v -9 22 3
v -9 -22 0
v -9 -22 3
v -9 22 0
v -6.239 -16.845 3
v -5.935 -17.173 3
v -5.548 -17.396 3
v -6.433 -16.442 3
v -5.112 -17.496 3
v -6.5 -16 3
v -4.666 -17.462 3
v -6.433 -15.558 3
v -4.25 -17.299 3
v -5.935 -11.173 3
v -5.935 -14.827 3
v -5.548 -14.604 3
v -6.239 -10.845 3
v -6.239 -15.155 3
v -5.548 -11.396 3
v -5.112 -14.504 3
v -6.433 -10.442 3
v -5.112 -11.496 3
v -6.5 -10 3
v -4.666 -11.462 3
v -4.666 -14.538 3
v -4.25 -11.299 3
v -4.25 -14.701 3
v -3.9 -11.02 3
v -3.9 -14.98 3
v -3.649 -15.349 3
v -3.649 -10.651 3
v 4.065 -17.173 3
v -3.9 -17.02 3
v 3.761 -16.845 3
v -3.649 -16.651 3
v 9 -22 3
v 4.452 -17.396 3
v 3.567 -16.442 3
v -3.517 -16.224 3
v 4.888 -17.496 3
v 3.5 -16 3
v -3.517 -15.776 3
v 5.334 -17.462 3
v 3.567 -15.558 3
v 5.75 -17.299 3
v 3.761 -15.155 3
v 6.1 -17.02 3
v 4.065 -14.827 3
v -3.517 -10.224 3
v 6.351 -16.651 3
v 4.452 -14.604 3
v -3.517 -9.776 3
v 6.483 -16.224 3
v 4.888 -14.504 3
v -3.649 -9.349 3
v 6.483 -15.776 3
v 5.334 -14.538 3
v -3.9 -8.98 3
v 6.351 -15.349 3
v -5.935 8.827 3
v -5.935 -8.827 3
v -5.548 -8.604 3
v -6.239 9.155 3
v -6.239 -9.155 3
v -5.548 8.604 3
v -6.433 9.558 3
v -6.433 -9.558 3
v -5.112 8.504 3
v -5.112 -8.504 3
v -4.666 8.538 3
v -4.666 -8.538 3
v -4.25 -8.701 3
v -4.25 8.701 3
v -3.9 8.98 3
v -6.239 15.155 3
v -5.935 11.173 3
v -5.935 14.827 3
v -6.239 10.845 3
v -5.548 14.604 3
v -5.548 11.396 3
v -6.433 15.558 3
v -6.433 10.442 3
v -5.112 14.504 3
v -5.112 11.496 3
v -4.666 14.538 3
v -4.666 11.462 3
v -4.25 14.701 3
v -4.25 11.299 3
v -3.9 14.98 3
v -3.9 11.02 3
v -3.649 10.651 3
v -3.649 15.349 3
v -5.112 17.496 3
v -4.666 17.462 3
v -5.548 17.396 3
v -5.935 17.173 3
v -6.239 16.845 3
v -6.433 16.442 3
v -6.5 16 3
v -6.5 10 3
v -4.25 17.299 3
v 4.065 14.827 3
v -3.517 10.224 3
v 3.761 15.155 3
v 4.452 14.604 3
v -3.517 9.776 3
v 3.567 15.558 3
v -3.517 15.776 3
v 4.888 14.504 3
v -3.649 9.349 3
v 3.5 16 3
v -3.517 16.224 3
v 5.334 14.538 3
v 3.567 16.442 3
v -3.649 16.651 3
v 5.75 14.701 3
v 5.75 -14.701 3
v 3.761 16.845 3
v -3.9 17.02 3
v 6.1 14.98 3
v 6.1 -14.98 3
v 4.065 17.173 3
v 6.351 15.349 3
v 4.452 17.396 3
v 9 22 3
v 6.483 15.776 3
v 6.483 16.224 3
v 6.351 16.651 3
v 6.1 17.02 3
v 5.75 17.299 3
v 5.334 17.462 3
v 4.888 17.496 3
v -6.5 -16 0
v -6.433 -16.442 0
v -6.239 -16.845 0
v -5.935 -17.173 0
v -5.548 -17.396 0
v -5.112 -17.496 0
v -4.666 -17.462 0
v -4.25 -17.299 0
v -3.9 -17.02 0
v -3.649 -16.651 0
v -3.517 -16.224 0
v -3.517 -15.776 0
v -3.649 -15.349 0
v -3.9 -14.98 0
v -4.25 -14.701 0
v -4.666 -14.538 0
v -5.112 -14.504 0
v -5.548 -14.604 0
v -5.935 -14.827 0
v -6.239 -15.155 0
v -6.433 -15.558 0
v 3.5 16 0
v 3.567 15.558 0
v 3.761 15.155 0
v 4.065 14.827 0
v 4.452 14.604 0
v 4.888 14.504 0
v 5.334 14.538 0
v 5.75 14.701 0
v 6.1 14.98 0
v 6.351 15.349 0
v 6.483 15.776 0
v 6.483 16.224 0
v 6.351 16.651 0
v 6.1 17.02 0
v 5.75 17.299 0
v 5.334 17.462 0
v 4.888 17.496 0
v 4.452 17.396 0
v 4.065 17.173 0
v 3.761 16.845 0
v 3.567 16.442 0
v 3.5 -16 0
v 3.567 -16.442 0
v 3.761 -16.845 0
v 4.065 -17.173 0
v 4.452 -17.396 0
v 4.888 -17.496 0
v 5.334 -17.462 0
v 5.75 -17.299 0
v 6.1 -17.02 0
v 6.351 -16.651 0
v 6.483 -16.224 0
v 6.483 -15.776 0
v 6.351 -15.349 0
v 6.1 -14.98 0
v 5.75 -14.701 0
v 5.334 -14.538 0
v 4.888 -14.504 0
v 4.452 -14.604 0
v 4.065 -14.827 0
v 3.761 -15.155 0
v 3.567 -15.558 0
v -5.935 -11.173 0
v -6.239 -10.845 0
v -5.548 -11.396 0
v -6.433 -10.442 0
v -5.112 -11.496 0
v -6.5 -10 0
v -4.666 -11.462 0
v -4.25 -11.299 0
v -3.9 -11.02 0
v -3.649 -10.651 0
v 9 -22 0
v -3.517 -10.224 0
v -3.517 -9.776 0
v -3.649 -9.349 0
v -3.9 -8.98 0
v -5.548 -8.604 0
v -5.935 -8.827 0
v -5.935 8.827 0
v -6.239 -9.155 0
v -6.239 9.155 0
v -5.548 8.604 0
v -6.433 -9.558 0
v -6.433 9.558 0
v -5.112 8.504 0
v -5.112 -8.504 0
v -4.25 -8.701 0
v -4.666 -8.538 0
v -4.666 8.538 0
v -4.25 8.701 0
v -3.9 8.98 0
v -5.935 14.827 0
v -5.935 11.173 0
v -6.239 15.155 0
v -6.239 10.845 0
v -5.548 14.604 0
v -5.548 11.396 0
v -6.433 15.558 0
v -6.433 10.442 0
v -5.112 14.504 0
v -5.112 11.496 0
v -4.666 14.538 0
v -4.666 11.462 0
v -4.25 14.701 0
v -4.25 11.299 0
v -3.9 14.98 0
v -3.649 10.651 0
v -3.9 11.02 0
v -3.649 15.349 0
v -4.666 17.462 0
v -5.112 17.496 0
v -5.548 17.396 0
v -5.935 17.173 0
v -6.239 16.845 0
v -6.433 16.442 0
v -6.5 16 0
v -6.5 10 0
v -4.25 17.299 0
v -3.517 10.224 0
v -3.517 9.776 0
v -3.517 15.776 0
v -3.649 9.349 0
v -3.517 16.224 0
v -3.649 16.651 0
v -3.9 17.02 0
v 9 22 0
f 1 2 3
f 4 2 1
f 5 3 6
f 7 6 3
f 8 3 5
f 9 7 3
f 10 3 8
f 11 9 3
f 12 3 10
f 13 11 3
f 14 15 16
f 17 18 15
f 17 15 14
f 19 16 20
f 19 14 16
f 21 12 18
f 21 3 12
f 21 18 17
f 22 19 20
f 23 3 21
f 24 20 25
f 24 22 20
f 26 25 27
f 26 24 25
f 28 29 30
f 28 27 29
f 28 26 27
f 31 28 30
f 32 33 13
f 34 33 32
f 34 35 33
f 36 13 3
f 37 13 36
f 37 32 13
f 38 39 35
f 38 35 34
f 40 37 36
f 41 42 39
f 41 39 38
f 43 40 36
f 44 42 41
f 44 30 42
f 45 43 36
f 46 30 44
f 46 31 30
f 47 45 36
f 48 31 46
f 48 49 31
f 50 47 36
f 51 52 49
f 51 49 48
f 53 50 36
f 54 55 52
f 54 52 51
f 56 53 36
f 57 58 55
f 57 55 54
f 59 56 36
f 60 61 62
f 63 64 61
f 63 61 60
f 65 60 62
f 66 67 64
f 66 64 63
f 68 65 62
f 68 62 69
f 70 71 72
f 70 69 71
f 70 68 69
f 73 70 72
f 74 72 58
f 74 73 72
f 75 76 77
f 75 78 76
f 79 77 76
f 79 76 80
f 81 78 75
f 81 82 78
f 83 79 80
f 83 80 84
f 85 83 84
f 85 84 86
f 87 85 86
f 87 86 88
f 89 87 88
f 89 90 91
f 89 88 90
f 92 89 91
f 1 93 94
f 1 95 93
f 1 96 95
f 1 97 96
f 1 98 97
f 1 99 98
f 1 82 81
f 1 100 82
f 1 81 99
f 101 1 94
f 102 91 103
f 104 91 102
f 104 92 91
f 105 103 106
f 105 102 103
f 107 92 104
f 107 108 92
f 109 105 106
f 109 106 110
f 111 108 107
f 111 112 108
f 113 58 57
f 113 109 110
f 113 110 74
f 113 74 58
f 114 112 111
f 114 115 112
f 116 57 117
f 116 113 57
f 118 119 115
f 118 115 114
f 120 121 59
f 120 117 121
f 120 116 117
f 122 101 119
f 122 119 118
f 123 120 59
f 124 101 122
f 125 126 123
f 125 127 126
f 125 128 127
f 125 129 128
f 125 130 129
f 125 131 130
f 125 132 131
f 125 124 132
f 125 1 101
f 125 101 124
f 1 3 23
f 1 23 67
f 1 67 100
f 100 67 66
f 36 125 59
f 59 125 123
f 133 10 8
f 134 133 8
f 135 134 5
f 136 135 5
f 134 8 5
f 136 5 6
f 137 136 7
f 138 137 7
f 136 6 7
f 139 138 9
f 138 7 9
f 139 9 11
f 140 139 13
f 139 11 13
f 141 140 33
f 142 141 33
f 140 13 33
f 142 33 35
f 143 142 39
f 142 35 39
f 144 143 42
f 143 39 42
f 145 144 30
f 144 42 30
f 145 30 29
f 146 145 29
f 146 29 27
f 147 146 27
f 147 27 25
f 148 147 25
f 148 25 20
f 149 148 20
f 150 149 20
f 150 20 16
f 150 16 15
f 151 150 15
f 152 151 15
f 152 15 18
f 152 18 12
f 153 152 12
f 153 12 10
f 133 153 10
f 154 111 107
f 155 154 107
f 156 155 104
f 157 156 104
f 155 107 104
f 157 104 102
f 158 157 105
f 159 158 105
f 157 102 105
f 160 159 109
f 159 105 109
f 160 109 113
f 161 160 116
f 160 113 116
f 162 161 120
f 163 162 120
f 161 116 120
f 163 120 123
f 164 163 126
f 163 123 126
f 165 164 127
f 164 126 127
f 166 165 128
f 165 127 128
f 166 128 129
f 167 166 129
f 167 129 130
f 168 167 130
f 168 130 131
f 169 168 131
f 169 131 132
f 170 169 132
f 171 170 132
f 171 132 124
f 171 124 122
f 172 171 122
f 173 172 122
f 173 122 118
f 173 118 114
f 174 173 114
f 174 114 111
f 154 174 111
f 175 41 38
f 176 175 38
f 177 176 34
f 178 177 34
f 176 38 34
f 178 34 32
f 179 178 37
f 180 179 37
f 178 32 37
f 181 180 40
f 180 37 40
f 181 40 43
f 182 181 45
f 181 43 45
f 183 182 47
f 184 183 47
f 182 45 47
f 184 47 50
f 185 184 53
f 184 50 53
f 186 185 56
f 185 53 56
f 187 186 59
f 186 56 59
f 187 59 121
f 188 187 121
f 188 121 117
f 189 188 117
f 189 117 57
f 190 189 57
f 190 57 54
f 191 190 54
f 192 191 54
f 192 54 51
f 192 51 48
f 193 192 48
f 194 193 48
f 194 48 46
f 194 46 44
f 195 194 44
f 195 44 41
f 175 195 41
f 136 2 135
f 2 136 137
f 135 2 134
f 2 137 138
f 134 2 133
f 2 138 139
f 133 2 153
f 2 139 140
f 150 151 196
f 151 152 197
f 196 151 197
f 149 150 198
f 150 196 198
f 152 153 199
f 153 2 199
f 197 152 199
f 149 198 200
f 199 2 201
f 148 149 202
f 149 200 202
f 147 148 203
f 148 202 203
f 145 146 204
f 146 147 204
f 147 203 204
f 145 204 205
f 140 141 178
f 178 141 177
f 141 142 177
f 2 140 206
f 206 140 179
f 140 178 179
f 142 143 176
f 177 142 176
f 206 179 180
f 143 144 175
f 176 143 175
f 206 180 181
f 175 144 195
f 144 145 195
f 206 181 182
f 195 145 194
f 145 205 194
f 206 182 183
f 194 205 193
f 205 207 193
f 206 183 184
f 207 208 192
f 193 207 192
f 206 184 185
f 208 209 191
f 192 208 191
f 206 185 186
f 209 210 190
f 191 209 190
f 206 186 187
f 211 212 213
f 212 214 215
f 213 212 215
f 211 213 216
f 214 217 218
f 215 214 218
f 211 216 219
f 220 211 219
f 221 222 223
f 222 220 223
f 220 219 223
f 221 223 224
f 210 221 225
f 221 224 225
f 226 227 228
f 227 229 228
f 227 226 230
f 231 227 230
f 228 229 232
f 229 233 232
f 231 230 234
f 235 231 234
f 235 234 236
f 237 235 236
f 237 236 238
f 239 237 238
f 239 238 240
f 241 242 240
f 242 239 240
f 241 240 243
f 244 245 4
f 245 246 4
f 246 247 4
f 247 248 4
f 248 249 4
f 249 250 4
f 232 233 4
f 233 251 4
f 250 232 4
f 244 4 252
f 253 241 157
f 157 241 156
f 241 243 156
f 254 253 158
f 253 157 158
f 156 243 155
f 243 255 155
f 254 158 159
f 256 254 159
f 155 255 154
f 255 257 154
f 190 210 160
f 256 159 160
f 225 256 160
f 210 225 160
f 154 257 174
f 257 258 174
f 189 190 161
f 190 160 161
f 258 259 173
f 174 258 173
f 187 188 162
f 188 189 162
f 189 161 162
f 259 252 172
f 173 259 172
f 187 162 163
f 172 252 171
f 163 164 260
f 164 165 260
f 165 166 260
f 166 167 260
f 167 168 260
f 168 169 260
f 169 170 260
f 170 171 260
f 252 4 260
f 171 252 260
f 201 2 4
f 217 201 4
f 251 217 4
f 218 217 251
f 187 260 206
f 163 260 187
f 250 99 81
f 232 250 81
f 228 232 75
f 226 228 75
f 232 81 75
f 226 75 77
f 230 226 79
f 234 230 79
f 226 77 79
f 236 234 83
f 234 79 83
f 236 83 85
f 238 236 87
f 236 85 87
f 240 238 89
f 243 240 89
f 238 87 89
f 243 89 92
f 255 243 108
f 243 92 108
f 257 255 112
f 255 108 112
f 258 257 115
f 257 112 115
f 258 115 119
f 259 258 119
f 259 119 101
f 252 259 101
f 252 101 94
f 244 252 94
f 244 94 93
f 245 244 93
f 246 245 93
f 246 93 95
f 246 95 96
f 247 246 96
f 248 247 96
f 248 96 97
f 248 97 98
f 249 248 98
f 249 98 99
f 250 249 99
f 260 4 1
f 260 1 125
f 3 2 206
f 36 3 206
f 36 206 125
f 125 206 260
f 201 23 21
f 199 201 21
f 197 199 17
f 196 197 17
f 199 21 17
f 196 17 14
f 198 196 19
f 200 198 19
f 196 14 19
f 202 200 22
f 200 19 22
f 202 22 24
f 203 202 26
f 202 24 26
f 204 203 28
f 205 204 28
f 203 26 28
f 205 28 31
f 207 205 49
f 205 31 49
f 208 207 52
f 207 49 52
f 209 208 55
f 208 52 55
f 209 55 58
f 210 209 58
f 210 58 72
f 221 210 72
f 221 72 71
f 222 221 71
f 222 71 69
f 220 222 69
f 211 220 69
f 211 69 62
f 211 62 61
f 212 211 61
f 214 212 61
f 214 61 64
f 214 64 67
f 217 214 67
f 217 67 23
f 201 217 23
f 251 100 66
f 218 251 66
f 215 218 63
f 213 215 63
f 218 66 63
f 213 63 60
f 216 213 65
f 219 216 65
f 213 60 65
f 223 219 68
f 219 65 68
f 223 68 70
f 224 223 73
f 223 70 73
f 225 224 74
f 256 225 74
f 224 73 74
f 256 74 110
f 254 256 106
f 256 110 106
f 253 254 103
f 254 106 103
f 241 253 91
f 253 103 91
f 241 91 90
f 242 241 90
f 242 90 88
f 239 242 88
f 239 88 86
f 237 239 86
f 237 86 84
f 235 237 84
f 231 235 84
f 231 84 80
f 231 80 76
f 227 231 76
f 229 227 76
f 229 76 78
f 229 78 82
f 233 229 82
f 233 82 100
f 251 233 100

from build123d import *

# Parameters (mm, degrees)
F0_W     = 18
F0_H     = 44
F1_DEPTH = 3
F2_D     = 3


with BuildPart() as f1:
    # F0 (on Top) → F1 (new body)
    with BuildSketch(Plane.XY):
        Rectangle(F0_W, F0_H)
        Polygon((5, 16), (5, -16), (-5, -16), (-5, -10), (-5, 10), (-5, 16), align=None, mode=Mode.SUBTRACT)
        Polygon((-5, -16), (5, -16), (5, 16), (-5, 16), (-5, 10), (-5, -10), align=None)
    extrude(amount=F1_DEPTH)

    # F2 (through all)
    with Locations(Plane(origin=(0, 0, 0), x_dir=(1, 0, 0), z_dir=(0, 0, -1))):
        with Locations((-5, -16), (-5, 16), (-5, 10), (-5, -10), (5, -16), (5, 16)):
            Hole(F2_D / 2)


solid = f1.part
